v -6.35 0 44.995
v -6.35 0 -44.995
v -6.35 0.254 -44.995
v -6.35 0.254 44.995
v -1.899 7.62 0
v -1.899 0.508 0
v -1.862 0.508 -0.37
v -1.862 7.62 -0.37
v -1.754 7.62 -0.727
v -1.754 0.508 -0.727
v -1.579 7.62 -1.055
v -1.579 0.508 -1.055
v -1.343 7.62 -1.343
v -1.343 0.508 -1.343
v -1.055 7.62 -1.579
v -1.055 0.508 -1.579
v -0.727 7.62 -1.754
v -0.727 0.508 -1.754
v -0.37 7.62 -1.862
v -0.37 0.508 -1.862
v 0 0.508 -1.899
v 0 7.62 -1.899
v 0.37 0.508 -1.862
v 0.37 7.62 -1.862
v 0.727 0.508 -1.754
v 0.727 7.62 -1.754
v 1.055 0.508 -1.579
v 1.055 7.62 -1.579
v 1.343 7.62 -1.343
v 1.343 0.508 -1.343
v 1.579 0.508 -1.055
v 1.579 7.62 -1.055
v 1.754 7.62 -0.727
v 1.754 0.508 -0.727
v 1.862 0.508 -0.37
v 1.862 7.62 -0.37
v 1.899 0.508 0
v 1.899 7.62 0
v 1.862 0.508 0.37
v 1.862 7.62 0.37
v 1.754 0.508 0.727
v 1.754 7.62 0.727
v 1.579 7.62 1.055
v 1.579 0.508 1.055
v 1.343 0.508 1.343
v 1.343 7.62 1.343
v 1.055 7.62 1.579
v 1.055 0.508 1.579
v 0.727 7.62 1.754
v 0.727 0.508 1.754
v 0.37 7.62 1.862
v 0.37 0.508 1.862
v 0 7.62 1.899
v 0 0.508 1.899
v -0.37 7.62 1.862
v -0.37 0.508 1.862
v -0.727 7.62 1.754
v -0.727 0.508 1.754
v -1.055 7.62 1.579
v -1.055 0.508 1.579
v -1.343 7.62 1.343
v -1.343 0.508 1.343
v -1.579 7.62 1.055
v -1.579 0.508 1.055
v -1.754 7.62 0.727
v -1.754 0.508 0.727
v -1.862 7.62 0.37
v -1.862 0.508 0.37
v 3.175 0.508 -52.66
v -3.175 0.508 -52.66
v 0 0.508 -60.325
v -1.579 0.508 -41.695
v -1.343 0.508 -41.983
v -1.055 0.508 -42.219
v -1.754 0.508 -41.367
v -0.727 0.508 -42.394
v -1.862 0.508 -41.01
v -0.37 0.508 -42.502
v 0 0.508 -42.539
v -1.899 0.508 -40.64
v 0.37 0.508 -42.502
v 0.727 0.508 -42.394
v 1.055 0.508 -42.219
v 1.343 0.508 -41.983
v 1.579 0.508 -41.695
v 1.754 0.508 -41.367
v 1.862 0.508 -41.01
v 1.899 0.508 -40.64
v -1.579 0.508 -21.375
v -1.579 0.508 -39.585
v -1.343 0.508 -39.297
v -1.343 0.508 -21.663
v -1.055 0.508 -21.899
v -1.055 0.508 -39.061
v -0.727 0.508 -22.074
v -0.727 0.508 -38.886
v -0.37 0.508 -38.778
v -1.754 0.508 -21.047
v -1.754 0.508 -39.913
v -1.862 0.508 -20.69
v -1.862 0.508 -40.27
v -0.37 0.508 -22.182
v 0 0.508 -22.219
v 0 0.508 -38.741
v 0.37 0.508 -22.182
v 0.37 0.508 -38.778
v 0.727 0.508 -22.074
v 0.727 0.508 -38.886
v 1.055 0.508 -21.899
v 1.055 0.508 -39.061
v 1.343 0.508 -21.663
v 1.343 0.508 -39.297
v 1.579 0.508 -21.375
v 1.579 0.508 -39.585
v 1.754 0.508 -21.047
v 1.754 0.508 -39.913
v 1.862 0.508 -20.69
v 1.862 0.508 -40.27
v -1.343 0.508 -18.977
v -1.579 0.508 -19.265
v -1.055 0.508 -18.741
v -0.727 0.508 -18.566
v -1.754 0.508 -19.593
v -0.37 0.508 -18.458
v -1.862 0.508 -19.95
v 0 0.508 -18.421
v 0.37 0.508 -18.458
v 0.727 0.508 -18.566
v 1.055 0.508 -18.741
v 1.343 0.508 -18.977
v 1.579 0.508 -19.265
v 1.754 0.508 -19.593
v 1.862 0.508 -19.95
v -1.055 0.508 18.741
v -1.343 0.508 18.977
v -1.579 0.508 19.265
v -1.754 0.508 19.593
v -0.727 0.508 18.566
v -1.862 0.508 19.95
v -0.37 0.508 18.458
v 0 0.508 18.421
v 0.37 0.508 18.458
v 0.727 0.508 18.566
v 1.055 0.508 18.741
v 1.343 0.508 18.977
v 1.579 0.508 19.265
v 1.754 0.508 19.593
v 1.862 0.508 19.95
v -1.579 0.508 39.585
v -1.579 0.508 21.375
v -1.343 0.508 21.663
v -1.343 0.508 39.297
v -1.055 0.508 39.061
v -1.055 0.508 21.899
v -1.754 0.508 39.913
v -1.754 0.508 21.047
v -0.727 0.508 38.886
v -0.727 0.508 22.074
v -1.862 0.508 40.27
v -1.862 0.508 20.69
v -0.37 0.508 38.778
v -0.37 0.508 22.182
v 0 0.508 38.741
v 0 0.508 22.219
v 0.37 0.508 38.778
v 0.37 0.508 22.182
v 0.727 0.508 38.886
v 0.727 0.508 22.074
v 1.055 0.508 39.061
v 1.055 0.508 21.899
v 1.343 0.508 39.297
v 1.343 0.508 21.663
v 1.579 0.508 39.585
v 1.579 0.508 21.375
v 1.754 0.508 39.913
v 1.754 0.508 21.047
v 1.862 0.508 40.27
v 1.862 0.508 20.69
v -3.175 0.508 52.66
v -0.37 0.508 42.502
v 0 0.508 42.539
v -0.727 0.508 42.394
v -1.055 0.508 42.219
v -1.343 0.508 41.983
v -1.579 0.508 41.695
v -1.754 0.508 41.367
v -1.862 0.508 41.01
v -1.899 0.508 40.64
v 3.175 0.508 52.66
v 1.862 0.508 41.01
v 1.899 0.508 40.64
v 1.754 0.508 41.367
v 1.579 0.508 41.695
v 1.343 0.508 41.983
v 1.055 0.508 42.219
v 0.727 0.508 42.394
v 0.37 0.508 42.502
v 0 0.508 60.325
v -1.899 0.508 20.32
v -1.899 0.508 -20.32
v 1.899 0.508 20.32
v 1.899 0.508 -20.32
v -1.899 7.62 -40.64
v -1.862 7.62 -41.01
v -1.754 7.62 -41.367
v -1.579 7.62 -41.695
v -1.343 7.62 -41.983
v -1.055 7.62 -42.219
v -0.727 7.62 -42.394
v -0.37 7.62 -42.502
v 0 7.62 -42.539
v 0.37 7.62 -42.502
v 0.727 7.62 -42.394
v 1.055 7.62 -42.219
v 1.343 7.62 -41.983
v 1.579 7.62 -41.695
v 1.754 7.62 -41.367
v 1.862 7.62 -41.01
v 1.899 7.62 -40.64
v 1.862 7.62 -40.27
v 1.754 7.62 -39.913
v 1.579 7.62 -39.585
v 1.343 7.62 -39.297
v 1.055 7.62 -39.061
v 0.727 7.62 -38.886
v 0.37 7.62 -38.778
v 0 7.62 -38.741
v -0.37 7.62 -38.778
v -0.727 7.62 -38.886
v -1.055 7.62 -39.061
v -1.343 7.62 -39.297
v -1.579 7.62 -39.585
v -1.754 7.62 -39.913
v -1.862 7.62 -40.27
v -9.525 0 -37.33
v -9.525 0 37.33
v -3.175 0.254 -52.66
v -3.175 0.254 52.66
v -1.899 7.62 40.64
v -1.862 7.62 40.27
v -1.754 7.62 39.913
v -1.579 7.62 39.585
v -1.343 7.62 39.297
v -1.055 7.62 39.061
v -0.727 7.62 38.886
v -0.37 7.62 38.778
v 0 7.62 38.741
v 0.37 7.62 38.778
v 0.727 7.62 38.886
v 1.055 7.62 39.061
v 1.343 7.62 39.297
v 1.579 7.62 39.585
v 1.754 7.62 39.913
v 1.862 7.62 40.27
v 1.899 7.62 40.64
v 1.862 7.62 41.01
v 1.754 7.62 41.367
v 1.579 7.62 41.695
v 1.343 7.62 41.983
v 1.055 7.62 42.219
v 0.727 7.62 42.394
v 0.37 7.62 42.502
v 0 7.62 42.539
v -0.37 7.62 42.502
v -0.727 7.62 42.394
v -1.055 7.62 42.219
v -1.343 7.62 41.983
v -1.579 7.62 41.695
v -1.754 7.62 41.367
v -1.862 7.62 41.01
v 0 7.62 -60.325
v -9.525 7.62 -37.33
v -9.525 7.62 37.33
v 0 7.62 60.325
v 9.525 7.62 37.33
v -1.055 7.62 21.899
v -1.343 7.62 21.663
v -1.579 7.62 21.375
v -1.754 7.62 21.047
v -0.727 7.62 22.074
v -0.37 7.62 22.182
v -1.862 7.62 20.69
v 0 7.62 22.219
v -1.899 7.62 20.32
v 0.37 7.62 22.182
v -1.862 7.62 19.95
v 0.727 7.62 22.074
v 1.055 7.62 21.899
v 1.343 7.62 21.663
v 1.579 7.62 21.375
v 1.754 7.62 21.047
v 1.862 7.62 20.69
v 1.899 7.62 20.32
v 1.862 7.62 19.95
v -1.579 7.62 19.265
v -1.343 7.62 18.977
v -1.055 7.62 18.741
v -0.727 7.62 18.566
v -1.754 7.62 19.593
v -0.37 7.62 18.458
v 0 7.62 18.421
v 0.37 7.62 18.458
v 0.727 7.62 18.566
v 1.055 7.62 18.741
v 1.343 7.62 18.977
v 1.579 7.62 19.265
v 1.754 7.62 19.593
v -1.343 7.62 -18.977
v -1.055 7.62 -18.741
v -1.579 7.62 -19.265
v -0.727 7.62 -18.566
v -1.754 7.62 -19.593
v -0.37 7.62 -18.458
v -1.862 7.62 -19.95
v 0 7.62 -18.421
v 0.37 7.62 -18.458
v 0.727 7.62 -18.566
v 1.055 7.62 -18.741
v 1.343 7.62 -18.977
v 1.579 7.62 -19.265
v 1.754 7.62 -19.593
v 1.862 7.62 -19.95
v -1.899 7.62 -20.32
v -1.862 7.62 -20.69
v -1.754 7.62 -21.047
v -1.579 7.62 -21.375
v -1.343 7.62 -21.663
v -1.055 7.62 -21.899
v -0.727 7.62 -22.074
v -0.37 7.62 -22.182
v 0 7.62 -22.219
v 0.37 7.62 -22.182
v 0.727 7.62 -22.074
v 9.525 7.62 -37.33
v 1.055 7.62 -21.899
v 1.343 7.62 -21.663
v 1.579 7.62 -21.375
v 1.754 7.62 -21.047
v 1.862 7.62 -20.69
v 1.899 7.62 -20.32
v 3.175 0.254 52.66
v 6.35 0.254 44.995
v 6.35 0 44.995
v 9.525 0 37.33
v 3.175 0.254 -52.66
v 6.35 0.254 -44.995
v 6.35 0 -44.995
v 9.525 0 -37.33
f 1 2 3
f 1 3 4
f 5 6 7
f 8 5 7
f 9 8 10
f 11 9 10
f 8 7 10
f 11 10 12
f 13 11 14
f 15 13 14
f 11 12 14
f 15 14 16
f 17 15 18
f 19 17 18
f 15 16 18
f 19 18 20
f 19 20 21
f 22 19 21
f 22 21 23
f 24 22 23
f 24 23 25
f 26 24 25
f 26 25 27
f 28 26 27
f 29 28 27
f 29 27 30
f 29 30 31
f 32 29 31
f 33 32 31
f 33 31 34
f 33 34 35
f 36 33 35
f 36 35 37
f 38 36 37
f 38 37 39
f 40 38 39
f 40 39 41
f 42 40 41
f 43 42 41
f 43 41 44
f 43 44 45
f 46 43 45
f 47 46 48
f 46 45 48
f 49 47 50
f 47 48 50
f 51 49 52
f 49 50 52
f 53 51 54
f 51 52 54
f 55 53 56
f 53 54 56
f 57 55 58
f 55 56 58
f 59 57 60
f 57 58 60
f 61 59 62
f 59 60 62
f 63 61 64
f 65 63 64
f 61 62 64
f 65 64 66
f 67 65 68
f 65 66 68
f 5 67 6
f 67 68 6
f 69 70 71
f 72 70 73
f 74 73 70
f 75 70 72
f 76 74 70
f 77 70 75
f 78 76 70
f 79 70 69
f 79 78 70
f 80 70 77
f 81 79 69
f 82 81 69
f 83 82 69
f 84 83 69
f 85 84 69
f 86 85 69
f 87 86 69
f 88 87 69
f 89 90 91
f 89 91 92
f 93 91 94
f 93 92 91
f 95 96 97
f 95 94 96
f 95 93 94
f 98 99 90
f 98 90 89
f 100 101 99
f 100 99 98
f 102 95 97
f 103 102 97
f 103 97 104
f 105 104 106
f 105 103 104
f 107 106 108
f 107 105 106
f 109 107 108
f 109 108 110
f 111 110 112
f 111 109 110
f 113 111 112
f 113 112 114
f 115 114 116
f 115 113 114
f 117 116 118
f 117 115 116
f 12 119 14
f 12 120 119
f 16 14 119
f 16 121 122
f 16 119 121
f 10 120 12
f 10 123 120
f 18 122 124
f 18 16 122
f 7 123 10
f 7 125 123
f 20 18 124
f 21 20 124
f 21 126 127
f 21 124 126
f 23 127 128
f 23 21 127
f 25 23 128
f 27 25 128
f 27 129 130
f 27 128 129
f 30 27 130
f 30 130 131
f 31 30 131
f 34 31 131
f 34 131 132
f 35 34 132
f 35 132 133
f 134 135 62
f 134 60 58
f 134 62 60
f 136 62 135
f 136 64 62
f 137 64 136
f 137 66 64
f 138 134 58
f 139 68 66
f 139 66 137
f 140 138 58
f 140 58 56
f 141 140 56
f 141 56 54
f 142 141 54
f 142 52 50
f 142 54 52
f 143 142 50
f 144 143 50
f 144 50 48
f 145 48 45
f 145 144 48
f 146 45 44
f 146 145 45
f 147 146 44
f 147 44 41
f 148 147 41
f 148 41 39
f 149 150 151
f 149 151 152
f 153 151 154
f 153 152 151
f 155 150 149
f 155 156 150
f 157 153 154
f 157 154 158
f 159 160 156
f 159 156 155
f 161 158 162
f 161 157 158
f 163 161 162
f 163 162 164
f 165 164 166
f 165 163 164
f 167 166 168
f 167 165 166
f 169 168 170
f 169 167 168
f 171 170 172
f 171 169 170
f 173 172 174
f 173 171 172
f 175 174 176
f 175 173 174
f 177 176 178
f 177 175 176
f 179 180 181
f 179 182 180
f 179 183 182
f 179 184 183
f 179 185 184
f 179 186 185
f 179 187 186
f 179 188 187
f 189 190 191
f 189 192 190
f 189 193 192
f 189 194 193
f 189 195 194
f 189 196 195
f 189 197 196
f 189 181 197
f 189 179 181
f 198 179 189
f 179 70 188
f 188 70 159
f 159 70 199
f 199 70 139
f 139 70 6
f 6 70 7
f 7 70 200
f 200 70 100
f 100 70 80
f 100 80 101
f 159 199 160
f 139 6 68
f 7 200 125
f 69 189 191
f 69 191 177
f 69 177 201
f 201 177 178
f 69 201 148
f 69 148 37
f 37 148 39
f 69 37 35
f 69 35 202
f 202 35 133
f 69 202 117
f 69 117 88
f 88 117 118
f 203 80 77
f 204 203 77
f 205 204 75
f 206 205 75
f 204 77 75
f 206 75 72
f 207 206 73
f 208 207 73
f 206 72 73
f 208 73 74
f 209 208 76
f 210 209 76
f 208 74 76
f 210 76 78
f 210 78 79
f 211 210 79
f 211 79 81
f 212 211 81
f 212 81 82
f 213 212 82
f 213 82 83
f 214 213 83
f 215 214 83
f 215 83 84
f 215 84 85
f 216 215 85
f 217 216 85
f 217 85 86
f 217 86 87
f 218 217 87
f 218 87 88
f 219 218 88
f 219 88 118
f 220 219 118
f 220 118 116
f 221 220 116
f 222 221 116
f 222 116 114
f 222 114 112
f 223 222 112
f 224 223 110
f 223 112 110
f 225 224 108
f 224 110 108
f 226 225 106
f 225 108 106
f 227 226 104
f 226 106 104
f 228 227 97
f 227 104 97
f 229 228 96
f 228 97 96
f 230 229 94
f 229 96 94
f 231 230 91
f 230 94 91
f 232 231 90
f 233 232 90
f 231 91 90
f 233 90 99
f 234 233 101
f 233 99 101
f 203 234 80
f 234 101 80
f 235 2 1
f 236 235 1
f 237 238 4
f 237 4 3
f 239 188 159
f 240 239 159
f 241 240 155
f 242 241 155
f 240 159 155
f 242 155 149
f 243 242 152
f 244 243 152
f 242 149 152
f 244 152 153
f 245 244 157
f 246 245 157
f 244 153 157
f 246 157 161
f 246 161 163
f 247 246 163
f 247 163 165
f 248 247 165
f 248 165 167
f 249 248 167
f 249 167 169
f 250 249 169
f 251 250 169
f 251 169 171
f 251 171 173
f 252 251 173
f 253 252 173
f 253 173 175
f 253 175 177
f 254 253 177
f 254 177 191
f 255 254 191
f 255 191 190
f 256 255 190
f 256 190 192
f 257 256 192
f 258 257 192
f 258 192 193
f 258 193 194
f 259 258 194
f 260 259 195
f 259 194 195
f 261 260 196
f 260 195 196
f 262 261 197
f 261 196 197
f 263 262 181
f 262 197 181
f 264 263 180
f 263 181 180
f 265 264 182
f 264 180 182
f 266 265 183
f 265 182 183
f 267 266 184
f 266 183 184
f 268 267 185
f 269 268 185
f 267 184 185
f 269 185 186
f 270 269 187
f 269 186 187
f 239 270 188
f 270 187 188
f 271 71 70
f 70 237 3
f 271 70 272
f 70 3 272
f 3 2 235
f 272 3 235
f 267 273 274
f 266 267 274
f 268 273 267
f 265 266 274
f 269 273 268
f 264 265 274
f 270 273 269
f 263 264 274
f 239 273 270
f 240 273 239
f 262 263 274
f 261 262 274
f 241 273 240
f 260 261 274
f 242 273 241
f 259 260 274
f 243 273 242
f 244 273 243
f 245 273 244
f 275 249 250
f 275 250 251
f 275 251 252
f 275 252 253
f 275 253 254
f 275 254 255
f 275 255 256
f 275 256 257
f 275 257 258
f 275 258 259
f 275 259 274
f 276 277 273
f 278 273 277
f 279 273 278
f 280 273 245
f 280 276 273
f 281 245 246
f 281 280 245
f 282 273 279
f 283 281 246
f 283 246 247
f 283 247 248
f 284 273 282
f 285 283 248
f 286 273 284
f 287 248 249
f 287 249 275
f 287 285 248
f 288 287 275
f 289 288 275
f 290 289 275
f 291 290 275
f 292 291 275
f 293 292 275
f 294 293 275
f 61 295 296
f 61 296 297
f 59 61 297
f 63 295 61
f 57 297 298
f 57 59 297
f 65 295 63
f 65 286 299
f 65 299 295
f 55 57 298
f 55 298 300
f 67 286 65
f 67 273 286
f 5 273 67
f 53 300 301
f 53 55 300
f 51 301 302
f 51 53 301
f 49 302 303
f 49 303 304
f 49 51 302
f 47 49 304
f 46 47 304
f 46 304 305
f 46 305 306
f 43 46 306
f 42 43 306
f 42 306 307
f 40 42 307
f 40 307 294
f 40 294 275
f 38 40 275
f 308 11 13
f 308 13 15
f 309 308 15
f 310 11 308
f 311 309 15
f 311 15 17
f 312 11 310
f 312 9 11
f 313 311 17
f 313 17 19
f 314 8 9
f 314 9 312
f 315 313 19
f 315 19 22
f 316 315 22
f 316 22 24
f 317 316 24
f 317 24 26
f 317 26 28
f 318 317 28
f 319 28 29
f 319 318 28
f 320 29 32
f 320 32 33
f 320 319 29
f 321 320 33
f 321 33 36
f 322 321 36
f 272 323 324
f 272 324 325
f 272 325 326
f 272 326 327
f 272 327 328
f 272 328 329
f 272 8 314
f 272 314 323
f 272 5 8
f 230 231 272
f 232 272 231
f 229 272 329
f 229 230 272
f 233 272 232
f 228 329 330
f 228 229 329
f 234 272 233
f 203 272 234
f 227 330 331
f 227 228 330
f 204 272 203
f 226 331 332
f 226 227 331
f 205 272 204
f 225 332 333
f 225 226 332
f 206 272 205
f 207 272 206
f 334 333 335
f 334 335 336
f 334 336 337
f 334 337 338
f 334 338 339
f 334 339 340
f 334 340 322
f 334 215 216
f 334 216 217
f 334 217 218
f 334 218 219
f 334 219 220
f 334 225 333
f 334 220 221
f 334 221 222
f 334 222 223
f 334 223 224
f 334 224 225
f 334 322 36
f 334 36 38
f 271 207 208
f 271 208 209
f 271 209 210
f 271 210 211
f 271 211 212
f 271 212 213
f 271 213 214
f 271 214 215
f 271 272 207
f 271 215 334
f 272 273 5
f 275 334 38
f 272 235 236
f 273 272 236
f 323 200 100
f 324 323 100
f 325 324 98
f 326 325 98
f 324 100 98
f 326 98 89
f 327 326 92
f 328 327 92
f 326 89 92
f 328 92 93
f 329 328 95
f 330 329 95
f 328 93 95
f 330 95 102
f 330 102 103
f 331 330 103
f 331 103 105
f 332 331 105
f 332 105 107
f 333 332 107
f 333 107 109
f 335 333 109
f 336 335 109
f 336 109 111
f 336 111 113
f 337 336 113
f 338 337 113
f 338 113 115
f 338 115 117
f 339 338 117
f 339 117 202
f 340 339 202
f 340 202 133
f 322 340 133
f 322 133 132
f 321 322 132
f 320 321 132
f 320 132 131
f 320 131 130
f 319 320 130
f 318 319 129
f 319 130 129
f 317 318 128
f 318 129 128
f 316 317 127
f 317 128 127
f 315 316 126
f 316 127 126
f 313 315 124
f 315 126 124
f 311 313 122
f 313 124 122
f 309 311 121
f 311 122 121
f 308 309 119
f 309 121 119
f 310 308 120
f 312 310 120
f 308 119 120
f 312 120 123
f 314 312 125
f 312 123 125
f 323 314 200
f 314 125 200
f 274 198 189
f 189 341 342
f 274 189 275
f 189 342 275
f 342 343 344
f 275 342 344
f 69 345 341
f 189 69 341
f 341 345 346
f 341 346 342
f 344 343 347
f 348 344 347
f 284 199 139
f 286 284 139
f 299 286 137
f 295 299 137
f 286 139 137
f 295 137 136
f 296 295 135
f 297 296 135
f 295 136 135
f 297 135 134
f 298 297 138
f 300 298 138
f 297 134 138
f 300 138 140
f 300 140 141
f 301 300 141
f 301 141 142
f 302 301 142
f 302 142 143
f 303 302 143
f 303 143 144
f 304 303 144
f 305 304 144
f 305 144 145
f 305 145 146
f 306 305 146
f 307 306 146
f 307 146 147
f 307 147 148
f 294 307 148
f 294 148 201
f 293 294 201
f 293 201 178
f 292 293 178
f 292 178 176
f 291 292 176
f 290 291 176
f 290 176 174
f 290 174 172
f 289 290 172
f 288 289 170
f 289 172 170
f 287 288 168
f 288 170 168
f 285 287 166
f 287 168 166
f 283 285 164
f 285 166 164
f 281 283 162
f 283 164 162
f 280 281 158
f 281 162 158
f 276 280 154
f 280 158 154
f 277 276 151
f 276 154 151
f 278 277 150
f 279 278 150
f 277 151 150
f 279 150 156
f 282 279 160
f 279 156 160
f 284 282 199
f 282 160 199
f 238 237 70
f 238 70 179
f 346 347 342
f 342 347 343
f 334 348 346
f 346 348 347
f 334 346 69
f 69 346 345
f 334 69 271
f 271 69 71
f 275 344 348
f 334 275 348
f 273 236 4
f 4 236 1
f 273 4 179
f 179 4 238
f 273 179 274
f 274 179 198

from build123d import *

# Parameters (mm, degrees)
BOSS_EXTRUDE1_DEPTH    = 7.62
SKETCH2_W              = 12.7
SKETCH2_H              = 120.65
CUT_EXTRUDE1_DEPTH     = 0.254
SKETCH3_W              = 6.35
SKETCH3_H              = 120.65
CUT_EXTRUDE2_DEPTH     = 0.254
F_10_24_TAPPED_HOLE1_D = 3.7973


with BuildPart() as part:
    # Sketch1 → Boss-Extrude1 (new body)
    with BuildSketch(Plane(origin=(0, 0, 0), x_dir=(1, 0, 0), z_dir=(0, 1, 0))):
        Polygon((0, 60.325), (-9.525, 37.329615818), (-9.525, -37.329615818), (0, -60.325), (9.525, -37.329615818), (9.525, 37.329615818), align=None)
    extrude(amount=BOSS_EXTRUDE1_DEPTH)

    # Sketch2 → Cut-Extrude1 (cut)
    with BuildSketch(Plane.XZ):
        Rectangle(SKETCH2_W, SKETCH2_H)
    extrude(amount=-CUT_EXTRUDE1_DEPTH, mode=Mode.SUBTRACT)

    # Sketch3 → Cut-Extrude2 (cut)
    with BuildSketch(Plane.XZ.offset(-0.254)):
        Rectangle(SKETCH3_W, SKETCH3_H)
    extrude(amount=-CUT_EXTRUDE2_DEPTH, mode=Mode.SUBTRACT)

    # #10-24 Tapped Hole1 (through all)
    with Locations(Plane(origin=(0, 7.62, 0), x_dir=(1, 0, 0), z_dir=(0, 1, 0))):
        with Locations((0, 20.32), (0, 40.64), (0, 0), (0, -20.32), (0, -40.64)):
            Hole(F_10_24_TAPPED_HOLE1_D / 2)


solid = part.part
